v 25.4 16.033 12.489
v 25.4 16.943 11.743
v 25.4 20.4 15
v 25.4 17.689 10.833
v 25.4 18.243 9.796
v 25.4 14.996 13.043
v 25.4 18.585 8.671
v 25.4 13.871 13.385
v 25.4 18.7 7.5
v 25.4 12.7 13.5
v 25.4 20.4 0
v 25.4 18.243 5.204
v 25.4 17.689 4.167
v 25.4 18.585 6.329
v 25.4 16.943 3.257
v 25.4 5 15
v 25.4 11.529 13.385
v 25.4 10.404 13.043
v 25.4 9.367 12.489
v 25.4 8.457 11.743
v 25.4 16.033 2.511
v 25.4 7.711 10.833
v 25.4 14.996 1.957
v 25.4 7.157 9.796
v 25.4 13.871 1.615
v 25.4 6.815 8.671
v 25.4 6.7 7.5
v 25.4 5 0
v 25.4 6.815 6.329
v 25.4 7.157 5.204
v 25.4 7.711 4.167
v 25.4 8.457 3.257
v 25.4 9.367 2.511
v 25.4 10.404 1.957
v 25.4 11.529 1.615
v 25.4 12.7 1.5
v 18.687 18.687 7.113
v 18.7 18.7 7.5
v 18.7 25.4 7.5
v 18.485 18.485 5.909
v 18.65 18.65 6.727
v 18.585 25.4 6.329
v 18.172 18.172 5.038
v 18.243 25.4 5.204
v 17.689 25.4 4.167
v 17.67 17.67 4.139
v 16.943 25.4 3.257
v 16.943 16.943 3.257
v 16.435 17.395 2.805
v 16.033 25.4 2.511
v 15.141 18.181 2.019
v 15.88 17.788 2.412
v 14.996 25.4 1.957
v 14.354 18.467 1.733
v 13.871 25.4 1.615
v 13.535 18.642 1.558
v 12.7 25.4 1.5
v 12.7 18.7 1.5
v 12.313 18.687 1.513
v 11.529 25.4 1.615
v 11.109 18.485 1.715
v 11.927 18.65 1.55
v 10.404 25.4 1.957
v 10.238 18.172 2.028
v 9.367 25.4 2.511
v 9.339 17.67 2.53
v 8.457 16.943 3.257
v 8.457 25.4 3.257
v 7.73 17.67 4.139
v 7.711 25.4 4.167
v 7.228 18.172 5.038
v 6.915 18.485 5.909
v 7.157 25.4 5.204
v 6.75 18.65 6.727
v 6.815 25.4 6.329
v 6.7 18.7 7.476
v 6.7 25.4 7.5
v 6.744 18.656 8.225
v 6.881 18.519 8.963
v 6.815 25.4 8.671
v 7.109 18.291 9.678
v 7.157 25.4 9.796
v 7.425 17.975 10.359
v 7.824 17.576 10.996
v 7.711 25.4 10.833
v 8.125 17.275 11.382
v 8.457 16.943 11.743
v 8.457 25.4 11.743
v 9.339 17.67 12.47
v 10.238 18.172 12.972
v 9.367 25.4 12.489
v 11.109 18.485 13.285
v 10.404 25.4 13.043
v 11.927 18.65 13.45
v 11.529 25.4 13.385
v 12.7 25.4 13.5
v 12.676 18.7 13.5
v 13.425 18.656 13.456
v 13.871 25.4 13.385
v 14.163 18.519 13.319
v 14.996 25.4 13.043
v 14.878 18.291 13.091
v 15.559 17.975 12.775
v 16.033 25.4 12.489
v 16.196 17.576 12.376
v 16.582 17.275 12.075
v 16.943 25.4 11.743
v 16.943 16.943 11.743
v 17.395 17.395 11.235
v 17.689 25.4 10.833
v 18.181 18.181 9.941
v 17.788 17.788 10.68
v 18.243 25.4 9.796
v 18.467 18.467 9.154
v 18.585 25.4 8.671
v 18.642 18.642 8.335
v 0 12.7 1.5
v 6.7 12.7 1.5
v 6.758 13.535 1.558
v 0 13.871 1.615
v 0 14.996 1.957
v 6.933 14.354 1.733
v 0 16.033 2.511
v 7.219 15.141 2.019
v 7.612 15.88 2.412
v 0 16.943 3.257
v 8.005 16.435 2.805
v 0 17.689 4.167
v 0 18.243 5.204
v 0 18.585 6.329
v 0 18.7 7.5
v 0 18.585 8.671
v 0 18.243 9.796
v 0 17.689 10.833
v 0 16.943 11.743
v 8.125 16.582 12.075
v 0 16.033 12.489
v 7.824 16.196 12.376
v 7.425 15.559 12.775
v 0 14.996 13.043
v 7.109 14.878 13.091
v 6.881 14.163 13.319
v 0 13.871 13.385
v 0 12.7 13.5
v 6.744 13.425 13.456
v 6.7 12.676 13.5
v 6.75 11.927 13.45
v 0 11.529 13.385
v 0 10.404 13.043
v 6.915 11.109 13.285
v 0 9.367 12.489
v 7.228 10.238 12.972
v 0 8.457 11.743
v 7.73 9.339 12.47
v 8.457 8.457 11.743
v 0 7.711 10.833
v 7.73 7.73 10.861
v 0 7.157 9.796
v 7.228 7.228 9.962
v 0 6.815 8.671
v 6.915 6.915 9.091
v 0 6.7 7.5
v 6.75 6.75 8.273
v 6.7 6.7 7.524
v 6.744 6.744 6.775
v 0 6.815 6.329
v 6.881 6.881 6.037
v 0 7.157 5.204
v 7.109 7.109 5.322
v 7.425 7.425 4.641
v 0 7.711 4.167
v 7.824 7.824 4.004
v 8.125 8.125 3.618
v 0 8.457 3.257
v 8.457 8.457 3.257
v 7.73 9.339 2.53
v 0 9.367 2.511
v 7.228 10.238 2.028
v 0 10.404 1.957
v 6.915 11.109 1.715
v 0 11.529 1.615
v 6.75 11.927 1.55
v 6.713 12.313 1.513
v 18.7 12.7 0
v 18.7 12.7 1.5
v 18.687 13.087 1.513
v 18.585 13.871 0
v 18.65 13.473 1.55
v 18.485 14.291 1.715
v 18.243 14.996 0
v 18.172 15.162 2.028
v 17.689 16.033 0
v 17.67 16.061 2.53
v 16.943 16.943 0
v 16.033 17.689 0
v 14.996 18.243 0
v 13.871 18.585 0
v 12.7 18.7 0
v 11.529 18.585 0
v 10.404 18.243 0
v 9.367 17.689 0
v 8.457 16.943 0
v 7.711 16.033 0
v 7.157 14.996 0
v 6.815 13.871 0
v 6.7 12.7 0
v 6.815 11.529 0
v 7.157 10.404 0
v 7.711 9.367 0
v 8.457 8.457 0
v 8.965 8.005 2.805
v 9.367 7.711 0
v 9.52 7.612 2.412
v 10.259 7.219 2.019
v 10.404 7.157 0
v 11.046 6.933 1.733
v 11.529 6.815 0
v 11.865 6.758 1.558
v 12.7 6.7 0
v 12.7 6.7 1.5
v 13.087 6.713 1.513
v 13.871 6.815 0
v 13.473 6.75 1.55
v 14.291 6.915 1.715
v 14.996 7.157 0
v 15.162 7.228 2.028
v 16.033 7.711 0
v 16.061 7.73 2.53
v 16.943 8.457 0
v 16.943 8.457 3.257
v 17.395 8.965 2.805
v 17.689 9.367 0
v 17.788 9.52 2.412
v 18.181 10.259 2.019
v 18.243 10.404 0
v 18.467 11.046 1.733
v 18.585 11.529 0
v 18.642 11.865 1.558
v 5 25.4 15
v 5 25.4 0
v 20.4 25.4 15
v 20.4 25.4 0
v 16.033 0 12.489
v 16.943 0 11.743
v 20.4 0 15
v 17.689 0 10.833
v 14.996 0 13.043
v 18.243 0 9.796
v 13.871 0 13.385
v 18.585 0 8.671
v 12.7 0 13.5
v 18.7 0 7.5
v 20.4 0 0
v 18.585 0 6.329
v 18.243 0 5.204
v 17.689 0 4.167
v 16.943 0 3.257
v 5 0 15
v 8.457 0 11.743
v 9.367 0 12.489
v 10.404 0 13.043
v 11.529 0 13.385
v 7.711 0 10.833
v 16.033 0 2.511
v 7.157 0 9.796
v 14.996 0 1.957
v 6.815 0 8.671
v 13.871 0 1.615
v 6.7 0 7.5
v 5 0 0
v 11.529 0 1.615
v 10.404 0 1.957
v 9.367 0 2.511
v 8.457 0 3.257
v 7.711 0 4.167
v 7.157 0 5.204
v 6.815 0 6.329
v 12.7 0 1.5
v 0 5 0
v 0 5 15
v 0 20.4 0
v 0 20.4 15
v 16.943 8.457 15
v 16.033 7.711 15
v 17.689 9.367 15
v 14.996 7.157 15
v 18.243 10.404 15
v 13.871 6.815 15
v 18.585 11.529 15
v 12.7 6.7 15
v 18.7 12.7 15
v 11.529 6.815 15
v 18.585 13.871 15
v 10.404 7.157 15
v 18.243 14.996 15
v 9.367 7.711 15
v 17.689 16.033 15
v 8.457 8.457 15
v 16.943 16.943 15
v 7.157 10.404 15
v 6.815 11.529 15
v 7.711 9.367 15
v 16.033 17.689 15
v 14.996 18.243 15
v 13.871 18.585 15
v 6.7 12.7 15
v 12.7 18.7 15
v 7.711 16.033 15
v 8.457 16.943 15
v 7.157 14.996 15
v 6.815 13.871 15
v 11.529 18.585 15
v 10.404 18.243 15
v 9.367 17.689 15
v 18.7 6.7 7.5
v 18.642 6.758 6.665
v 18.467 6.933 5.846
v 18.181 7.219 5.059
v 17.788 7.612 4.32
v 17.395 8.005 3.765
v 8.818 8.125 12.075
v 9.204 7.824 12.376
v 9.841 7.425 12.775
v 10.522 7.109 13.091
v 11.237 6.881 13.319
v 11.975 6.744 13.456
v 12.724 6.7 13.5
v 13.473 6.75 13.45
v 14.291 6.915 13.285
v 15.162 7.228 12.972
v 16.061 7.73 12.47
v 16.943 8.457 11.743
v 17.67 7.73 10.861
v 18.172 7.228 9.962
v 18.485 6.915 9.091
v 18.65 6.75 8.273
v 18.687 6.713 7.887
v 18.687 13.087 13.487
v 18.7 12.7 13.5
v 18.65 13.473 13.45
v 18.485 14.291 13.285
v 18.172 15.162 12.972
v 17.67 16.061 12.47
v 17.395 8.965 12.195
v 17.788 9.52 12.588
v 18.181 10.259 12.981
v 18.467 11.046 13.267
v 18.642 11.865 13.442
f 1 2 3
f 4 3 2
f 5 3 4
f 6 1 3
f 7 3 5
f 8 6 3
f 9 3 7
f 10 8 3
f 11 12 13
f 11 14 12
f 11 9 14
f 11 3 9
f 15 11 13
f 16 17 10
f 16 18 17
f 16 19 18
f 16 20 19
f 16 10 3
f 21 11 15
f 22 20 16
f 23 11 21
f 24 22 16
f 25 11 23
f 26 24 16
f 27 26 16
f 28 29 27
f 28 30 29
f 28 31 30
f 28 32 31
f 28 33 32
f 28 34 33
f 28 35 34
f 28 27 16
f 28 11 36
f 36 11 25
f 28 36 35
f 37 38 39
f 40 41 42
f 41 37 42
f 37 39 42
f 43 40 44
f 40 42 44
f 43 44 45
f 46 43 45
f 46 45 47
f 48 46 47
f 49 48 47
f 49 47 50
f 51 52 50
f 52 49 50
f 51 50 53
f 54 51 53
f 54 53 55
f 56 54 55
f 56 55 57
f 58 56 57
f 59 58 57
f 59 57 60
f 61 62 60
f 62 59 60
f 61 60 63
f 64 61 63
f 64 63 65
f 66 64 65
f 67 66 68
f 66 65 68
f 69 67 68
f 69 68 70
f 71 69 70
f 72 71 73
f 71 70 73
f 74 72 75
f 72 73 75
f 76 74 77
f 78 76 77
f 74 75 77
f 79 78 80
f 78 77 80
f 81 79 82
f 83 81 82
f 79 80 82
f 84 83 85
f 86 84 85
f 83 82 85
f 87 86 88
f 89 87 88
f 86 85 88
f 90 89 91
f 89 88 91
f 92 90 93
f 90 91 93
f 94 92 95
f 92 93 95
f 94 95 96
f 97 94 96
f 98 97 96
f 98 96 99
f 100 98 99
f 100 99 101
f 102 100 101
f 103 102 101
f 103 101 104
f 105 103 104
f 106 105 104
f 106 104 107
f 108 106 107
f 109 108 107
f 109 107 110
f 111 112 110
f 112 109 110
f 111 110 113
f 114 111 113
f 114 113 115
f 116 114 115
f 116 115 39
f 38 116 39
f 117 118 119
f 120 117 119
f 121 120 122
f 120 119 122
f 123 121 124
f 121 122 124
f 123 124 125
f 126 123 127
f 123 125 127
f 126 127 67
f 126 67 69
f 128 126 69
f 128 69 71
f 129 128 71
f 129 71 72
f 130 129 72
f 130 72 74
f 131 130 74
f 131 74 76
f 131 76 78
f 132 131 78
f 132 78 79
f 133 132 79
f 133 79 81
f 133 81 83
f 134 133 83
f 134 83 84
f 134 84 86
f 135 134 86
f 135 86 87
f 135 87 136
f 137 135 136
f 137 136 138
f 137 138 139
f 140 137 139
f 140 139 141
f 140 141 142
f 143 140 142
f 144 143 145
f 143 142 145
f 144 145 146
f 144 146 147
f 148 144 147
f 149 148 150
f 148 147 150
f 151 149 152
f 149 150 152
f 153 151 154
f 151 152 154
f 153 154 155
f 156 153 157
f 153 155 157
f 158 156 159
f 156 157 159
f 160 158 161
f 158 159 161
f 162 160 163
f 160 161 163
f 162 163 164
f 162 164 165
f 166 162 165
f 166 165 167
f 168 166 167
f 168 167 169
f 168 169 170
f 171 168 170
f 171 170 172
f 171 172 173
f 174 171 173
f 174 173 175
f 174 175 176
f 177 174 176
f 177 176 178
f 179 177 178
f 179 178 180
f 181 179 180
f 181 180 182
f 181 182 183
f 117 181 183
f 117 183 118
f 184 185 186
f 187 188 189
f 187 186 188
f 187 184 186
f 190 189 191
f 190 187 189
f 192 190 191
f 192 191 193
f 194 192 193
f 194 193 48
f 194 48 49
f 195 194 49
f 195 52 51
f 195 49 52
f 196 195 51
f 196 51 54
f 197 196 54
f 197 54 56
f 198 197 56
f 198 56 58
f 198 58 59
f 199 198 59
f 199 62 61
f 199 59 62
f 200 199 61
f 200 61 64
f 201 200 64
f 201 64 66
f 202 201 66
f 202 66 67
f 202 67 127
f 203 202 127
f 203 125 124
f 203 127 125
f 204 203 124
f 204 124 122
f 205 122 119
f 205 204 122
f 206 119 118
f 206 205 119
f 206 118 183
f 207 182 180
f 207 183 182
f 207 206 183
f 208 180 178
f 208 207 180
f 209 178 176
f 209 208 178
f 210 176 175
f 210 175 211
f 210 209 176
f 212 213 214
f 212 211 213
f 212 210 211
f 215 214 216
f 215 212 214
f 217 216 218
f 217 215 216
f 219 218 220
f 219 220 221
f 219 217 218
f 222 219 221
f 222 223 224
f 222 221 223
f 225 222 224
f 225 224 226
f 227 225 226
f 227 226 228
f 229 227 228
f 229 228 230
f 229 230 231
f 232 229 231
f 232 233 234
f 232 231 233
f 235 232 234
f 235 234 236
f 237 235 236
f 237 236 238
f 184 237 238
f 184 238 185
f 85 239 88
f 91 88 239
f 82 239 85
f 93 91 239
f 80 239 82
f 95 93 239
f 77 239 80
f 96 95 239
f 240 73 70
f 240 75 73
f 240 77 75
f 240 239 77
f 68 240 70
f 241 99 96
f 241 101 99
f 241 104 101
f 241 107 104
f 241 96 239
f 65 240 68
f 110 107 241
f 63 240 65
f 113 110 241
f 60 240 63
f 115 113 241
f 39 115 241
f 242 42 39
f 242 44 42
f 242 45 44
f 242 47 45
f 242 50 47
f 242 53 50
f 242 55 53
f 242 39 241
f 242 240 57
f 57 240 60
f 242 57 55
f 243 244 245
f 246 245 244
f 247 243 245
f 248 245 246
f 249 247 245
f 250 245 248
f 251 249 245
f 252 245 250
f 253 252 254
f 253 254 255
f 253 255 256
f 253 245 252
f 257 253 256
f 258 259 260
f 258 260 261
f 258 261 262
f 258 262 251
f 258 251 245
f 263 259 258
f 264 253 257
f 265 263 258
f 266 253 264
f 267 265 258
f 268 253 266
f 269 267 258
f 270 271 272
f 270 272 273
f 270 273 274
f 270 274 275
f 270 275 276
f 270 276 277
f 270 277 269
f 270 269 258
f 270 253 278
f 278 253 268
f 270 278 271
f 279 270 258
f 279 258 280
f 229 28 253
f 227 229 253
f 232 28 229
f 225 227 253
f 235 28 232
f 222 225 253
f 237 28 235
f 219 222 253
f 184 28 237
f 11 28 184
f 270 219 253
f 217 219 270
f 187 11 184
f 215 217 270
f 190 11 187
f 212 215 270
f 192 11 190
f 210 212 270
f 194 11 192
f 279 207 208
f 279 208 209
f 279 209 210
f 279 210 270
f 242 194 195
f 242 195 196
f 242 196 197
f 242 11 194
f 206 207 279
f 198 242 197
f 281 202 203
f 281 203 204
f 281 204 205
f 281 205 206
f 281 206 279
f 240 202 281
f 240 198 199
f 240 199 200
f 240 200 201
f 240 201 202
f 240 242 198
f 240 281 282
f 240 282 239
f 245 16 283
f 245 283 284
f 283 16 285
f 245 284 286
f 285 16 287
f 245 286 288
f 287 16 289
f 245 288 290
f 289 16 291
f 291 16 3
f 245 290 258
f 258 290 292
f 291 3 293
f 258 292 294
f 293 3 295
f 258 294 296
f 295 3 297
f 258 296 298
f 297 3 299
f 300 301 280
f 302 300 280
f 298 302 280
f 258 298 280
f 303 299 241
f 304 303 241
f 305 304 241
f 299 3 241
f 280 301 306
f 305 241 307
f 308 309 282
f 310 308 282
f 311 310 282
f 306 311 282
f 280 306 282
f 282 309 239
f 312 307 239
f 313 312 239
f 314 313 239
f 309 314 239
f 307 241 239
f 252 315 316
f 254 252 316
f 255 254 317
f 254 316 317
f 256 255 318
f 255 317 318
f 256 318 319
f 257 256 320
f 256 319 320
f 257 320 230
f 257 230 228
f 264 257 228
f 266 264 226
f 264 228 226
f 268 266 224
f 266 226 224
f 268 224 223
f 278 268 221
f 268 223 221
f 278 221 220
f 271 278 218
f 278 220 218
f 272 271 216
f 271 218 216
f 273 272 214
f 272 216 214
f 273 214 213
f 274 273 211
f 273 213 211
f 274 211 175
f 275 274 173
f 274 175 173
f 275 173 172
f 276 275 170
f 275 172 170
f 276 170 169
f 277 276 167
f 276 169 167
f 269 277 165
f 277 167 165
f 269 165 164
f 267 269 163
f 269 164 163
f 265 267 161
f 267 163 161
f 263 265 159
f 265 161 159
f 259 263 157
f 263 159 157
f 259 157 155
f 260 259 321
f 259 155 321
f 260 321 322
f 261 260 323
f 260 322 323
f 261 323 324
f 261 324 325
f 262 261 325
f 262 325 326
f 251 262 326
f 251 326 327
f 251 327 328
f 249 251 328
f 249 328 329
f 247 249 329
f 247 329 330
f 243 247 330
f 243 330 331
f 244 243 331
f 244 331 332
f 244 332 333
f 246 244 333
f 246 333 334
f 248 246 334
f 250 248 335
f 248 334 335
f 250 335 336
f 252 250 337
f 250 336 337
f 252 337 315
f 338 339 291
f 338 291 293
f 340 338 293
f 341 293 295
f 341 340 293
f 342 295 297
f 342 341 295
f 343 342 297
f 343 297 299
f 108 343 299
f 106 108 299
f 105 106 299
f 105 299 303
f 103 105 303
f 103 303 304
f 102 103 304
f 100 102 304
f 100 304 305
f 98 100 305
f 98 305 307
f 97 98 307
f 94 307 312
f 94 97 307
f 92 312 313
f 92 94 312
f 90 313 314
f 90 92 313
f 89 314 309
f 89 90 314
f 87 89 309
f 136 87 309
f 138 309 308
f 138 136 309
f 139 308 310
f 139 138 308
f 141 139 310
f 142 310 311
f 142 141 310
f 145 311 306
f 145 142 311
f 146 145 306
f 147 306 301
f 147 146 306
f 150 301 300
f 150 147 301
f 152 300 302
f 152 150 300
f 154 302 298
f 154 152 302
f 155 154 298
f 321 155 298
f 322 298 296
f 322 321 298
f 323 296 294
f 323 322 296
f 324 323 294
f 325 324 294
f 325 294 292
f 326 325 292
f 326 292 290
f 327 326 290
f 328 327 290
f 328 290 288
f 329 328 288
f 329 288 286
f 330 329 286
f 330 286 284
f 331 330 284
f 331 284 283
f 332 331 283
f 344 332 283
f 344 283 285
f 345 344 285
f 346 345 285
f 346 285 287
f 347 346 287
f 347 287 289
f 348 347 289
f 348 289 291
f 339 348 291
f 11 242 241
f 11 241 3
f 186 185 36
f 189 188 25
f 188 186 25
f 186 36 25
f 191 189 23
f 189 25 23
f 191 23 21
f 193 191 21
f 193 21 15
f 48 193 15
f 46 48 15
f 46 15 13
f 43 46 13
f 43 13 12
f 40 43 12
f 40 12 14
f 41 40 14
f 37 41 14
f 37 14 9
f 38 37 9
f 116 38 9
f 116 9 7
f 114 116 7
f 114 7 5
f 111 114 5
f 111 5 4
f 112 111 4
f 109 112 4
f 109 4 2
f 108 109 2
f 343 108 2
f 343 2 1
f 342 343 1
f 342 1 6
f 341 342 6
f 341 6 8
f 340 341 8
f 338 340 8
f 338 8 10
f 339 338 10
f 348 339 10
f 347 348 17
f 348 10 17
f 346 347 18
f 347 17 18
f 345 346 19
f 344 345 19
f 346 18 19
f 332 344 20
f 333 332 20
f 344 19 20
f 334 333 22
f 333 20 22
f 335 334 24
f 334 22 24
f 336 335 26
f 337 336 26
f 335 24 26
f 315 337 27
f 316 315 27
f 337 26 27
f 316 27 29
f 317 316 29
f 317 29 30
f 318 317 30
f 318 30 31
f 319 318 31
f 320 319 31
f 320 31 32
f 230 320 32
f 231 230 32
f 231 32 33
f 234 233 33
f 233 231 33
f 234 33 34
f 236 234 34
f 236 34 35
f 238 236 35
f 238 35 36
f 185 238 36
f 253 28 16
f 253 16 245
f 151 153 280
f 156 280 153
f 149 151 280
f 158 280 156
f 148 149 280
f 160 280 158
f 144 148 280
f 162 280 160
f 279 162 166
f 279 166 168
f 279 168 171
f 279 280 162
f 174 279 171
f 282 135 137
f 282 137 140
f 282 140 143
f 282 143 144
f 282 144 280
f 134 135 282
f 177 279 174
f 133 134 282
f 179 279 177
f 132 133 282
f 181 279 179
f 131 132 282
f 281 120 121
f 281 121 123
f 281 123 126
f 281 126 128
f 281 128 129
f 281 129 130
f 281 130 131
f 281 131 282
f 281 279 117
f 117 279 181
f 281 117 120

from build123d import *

# Parameters (mm, degrees)
SKETCH2_R           = 6
BOSS_EXTRUDE1_DEPTH = 15
SKETCH3_R           = 6
CUT_EXTRUDE1_DEPTH  = 27
SKETCH4_R           = 6
CUT_EXTRUDE2_DEPTH  = 27


with BuildPart() as part:
    # Sketch2 → Boss-Extrude1 (new body)
    with BuildSketch(Plane.XY):
        Polygon((0, 20.4), (5, 25.4), (20.4, 25.4), (25.4, 20.4), (25.4, 5), (20.4, 0), (5, 0), (0, 5), align=None)
        with Locations((12.7, 12.7)):
            Circle(SKETCH2_R, mode=Mode.SUBTRACT)
    extrude(amount=BOSS_EXTRUDE1_DEPTH)

    # Sketch3 → Cut-Extrude1 (cut)
    with BuildSketch(Plane(origin=(25.4, 0, 0), x_dir=(0, 0, -1), z_dir=(1, 0, 0))):
        with Locations((-7.5, 12.7)):
            Circle(SKETCH3_R)
    extrude(amount=-CUT_EXTRUDE1_DEPTH, mode=Mode.SUBTRACT)

    # Sketch4 → Cut-Extrude2 (cut)
    with BuildSketch(Plane(origin=(0, 25.4, 0), x_dir=(1, 0, 0), z_dir=(0, 1, 0))):
        with Locations((12.7, -7.5)):
            Circle(SKETCH4_R)
    extrude(amount=-CUT_EXTRUDE2_DEPTH, mode=Mode.SUBTRACT)


solid = part.part
